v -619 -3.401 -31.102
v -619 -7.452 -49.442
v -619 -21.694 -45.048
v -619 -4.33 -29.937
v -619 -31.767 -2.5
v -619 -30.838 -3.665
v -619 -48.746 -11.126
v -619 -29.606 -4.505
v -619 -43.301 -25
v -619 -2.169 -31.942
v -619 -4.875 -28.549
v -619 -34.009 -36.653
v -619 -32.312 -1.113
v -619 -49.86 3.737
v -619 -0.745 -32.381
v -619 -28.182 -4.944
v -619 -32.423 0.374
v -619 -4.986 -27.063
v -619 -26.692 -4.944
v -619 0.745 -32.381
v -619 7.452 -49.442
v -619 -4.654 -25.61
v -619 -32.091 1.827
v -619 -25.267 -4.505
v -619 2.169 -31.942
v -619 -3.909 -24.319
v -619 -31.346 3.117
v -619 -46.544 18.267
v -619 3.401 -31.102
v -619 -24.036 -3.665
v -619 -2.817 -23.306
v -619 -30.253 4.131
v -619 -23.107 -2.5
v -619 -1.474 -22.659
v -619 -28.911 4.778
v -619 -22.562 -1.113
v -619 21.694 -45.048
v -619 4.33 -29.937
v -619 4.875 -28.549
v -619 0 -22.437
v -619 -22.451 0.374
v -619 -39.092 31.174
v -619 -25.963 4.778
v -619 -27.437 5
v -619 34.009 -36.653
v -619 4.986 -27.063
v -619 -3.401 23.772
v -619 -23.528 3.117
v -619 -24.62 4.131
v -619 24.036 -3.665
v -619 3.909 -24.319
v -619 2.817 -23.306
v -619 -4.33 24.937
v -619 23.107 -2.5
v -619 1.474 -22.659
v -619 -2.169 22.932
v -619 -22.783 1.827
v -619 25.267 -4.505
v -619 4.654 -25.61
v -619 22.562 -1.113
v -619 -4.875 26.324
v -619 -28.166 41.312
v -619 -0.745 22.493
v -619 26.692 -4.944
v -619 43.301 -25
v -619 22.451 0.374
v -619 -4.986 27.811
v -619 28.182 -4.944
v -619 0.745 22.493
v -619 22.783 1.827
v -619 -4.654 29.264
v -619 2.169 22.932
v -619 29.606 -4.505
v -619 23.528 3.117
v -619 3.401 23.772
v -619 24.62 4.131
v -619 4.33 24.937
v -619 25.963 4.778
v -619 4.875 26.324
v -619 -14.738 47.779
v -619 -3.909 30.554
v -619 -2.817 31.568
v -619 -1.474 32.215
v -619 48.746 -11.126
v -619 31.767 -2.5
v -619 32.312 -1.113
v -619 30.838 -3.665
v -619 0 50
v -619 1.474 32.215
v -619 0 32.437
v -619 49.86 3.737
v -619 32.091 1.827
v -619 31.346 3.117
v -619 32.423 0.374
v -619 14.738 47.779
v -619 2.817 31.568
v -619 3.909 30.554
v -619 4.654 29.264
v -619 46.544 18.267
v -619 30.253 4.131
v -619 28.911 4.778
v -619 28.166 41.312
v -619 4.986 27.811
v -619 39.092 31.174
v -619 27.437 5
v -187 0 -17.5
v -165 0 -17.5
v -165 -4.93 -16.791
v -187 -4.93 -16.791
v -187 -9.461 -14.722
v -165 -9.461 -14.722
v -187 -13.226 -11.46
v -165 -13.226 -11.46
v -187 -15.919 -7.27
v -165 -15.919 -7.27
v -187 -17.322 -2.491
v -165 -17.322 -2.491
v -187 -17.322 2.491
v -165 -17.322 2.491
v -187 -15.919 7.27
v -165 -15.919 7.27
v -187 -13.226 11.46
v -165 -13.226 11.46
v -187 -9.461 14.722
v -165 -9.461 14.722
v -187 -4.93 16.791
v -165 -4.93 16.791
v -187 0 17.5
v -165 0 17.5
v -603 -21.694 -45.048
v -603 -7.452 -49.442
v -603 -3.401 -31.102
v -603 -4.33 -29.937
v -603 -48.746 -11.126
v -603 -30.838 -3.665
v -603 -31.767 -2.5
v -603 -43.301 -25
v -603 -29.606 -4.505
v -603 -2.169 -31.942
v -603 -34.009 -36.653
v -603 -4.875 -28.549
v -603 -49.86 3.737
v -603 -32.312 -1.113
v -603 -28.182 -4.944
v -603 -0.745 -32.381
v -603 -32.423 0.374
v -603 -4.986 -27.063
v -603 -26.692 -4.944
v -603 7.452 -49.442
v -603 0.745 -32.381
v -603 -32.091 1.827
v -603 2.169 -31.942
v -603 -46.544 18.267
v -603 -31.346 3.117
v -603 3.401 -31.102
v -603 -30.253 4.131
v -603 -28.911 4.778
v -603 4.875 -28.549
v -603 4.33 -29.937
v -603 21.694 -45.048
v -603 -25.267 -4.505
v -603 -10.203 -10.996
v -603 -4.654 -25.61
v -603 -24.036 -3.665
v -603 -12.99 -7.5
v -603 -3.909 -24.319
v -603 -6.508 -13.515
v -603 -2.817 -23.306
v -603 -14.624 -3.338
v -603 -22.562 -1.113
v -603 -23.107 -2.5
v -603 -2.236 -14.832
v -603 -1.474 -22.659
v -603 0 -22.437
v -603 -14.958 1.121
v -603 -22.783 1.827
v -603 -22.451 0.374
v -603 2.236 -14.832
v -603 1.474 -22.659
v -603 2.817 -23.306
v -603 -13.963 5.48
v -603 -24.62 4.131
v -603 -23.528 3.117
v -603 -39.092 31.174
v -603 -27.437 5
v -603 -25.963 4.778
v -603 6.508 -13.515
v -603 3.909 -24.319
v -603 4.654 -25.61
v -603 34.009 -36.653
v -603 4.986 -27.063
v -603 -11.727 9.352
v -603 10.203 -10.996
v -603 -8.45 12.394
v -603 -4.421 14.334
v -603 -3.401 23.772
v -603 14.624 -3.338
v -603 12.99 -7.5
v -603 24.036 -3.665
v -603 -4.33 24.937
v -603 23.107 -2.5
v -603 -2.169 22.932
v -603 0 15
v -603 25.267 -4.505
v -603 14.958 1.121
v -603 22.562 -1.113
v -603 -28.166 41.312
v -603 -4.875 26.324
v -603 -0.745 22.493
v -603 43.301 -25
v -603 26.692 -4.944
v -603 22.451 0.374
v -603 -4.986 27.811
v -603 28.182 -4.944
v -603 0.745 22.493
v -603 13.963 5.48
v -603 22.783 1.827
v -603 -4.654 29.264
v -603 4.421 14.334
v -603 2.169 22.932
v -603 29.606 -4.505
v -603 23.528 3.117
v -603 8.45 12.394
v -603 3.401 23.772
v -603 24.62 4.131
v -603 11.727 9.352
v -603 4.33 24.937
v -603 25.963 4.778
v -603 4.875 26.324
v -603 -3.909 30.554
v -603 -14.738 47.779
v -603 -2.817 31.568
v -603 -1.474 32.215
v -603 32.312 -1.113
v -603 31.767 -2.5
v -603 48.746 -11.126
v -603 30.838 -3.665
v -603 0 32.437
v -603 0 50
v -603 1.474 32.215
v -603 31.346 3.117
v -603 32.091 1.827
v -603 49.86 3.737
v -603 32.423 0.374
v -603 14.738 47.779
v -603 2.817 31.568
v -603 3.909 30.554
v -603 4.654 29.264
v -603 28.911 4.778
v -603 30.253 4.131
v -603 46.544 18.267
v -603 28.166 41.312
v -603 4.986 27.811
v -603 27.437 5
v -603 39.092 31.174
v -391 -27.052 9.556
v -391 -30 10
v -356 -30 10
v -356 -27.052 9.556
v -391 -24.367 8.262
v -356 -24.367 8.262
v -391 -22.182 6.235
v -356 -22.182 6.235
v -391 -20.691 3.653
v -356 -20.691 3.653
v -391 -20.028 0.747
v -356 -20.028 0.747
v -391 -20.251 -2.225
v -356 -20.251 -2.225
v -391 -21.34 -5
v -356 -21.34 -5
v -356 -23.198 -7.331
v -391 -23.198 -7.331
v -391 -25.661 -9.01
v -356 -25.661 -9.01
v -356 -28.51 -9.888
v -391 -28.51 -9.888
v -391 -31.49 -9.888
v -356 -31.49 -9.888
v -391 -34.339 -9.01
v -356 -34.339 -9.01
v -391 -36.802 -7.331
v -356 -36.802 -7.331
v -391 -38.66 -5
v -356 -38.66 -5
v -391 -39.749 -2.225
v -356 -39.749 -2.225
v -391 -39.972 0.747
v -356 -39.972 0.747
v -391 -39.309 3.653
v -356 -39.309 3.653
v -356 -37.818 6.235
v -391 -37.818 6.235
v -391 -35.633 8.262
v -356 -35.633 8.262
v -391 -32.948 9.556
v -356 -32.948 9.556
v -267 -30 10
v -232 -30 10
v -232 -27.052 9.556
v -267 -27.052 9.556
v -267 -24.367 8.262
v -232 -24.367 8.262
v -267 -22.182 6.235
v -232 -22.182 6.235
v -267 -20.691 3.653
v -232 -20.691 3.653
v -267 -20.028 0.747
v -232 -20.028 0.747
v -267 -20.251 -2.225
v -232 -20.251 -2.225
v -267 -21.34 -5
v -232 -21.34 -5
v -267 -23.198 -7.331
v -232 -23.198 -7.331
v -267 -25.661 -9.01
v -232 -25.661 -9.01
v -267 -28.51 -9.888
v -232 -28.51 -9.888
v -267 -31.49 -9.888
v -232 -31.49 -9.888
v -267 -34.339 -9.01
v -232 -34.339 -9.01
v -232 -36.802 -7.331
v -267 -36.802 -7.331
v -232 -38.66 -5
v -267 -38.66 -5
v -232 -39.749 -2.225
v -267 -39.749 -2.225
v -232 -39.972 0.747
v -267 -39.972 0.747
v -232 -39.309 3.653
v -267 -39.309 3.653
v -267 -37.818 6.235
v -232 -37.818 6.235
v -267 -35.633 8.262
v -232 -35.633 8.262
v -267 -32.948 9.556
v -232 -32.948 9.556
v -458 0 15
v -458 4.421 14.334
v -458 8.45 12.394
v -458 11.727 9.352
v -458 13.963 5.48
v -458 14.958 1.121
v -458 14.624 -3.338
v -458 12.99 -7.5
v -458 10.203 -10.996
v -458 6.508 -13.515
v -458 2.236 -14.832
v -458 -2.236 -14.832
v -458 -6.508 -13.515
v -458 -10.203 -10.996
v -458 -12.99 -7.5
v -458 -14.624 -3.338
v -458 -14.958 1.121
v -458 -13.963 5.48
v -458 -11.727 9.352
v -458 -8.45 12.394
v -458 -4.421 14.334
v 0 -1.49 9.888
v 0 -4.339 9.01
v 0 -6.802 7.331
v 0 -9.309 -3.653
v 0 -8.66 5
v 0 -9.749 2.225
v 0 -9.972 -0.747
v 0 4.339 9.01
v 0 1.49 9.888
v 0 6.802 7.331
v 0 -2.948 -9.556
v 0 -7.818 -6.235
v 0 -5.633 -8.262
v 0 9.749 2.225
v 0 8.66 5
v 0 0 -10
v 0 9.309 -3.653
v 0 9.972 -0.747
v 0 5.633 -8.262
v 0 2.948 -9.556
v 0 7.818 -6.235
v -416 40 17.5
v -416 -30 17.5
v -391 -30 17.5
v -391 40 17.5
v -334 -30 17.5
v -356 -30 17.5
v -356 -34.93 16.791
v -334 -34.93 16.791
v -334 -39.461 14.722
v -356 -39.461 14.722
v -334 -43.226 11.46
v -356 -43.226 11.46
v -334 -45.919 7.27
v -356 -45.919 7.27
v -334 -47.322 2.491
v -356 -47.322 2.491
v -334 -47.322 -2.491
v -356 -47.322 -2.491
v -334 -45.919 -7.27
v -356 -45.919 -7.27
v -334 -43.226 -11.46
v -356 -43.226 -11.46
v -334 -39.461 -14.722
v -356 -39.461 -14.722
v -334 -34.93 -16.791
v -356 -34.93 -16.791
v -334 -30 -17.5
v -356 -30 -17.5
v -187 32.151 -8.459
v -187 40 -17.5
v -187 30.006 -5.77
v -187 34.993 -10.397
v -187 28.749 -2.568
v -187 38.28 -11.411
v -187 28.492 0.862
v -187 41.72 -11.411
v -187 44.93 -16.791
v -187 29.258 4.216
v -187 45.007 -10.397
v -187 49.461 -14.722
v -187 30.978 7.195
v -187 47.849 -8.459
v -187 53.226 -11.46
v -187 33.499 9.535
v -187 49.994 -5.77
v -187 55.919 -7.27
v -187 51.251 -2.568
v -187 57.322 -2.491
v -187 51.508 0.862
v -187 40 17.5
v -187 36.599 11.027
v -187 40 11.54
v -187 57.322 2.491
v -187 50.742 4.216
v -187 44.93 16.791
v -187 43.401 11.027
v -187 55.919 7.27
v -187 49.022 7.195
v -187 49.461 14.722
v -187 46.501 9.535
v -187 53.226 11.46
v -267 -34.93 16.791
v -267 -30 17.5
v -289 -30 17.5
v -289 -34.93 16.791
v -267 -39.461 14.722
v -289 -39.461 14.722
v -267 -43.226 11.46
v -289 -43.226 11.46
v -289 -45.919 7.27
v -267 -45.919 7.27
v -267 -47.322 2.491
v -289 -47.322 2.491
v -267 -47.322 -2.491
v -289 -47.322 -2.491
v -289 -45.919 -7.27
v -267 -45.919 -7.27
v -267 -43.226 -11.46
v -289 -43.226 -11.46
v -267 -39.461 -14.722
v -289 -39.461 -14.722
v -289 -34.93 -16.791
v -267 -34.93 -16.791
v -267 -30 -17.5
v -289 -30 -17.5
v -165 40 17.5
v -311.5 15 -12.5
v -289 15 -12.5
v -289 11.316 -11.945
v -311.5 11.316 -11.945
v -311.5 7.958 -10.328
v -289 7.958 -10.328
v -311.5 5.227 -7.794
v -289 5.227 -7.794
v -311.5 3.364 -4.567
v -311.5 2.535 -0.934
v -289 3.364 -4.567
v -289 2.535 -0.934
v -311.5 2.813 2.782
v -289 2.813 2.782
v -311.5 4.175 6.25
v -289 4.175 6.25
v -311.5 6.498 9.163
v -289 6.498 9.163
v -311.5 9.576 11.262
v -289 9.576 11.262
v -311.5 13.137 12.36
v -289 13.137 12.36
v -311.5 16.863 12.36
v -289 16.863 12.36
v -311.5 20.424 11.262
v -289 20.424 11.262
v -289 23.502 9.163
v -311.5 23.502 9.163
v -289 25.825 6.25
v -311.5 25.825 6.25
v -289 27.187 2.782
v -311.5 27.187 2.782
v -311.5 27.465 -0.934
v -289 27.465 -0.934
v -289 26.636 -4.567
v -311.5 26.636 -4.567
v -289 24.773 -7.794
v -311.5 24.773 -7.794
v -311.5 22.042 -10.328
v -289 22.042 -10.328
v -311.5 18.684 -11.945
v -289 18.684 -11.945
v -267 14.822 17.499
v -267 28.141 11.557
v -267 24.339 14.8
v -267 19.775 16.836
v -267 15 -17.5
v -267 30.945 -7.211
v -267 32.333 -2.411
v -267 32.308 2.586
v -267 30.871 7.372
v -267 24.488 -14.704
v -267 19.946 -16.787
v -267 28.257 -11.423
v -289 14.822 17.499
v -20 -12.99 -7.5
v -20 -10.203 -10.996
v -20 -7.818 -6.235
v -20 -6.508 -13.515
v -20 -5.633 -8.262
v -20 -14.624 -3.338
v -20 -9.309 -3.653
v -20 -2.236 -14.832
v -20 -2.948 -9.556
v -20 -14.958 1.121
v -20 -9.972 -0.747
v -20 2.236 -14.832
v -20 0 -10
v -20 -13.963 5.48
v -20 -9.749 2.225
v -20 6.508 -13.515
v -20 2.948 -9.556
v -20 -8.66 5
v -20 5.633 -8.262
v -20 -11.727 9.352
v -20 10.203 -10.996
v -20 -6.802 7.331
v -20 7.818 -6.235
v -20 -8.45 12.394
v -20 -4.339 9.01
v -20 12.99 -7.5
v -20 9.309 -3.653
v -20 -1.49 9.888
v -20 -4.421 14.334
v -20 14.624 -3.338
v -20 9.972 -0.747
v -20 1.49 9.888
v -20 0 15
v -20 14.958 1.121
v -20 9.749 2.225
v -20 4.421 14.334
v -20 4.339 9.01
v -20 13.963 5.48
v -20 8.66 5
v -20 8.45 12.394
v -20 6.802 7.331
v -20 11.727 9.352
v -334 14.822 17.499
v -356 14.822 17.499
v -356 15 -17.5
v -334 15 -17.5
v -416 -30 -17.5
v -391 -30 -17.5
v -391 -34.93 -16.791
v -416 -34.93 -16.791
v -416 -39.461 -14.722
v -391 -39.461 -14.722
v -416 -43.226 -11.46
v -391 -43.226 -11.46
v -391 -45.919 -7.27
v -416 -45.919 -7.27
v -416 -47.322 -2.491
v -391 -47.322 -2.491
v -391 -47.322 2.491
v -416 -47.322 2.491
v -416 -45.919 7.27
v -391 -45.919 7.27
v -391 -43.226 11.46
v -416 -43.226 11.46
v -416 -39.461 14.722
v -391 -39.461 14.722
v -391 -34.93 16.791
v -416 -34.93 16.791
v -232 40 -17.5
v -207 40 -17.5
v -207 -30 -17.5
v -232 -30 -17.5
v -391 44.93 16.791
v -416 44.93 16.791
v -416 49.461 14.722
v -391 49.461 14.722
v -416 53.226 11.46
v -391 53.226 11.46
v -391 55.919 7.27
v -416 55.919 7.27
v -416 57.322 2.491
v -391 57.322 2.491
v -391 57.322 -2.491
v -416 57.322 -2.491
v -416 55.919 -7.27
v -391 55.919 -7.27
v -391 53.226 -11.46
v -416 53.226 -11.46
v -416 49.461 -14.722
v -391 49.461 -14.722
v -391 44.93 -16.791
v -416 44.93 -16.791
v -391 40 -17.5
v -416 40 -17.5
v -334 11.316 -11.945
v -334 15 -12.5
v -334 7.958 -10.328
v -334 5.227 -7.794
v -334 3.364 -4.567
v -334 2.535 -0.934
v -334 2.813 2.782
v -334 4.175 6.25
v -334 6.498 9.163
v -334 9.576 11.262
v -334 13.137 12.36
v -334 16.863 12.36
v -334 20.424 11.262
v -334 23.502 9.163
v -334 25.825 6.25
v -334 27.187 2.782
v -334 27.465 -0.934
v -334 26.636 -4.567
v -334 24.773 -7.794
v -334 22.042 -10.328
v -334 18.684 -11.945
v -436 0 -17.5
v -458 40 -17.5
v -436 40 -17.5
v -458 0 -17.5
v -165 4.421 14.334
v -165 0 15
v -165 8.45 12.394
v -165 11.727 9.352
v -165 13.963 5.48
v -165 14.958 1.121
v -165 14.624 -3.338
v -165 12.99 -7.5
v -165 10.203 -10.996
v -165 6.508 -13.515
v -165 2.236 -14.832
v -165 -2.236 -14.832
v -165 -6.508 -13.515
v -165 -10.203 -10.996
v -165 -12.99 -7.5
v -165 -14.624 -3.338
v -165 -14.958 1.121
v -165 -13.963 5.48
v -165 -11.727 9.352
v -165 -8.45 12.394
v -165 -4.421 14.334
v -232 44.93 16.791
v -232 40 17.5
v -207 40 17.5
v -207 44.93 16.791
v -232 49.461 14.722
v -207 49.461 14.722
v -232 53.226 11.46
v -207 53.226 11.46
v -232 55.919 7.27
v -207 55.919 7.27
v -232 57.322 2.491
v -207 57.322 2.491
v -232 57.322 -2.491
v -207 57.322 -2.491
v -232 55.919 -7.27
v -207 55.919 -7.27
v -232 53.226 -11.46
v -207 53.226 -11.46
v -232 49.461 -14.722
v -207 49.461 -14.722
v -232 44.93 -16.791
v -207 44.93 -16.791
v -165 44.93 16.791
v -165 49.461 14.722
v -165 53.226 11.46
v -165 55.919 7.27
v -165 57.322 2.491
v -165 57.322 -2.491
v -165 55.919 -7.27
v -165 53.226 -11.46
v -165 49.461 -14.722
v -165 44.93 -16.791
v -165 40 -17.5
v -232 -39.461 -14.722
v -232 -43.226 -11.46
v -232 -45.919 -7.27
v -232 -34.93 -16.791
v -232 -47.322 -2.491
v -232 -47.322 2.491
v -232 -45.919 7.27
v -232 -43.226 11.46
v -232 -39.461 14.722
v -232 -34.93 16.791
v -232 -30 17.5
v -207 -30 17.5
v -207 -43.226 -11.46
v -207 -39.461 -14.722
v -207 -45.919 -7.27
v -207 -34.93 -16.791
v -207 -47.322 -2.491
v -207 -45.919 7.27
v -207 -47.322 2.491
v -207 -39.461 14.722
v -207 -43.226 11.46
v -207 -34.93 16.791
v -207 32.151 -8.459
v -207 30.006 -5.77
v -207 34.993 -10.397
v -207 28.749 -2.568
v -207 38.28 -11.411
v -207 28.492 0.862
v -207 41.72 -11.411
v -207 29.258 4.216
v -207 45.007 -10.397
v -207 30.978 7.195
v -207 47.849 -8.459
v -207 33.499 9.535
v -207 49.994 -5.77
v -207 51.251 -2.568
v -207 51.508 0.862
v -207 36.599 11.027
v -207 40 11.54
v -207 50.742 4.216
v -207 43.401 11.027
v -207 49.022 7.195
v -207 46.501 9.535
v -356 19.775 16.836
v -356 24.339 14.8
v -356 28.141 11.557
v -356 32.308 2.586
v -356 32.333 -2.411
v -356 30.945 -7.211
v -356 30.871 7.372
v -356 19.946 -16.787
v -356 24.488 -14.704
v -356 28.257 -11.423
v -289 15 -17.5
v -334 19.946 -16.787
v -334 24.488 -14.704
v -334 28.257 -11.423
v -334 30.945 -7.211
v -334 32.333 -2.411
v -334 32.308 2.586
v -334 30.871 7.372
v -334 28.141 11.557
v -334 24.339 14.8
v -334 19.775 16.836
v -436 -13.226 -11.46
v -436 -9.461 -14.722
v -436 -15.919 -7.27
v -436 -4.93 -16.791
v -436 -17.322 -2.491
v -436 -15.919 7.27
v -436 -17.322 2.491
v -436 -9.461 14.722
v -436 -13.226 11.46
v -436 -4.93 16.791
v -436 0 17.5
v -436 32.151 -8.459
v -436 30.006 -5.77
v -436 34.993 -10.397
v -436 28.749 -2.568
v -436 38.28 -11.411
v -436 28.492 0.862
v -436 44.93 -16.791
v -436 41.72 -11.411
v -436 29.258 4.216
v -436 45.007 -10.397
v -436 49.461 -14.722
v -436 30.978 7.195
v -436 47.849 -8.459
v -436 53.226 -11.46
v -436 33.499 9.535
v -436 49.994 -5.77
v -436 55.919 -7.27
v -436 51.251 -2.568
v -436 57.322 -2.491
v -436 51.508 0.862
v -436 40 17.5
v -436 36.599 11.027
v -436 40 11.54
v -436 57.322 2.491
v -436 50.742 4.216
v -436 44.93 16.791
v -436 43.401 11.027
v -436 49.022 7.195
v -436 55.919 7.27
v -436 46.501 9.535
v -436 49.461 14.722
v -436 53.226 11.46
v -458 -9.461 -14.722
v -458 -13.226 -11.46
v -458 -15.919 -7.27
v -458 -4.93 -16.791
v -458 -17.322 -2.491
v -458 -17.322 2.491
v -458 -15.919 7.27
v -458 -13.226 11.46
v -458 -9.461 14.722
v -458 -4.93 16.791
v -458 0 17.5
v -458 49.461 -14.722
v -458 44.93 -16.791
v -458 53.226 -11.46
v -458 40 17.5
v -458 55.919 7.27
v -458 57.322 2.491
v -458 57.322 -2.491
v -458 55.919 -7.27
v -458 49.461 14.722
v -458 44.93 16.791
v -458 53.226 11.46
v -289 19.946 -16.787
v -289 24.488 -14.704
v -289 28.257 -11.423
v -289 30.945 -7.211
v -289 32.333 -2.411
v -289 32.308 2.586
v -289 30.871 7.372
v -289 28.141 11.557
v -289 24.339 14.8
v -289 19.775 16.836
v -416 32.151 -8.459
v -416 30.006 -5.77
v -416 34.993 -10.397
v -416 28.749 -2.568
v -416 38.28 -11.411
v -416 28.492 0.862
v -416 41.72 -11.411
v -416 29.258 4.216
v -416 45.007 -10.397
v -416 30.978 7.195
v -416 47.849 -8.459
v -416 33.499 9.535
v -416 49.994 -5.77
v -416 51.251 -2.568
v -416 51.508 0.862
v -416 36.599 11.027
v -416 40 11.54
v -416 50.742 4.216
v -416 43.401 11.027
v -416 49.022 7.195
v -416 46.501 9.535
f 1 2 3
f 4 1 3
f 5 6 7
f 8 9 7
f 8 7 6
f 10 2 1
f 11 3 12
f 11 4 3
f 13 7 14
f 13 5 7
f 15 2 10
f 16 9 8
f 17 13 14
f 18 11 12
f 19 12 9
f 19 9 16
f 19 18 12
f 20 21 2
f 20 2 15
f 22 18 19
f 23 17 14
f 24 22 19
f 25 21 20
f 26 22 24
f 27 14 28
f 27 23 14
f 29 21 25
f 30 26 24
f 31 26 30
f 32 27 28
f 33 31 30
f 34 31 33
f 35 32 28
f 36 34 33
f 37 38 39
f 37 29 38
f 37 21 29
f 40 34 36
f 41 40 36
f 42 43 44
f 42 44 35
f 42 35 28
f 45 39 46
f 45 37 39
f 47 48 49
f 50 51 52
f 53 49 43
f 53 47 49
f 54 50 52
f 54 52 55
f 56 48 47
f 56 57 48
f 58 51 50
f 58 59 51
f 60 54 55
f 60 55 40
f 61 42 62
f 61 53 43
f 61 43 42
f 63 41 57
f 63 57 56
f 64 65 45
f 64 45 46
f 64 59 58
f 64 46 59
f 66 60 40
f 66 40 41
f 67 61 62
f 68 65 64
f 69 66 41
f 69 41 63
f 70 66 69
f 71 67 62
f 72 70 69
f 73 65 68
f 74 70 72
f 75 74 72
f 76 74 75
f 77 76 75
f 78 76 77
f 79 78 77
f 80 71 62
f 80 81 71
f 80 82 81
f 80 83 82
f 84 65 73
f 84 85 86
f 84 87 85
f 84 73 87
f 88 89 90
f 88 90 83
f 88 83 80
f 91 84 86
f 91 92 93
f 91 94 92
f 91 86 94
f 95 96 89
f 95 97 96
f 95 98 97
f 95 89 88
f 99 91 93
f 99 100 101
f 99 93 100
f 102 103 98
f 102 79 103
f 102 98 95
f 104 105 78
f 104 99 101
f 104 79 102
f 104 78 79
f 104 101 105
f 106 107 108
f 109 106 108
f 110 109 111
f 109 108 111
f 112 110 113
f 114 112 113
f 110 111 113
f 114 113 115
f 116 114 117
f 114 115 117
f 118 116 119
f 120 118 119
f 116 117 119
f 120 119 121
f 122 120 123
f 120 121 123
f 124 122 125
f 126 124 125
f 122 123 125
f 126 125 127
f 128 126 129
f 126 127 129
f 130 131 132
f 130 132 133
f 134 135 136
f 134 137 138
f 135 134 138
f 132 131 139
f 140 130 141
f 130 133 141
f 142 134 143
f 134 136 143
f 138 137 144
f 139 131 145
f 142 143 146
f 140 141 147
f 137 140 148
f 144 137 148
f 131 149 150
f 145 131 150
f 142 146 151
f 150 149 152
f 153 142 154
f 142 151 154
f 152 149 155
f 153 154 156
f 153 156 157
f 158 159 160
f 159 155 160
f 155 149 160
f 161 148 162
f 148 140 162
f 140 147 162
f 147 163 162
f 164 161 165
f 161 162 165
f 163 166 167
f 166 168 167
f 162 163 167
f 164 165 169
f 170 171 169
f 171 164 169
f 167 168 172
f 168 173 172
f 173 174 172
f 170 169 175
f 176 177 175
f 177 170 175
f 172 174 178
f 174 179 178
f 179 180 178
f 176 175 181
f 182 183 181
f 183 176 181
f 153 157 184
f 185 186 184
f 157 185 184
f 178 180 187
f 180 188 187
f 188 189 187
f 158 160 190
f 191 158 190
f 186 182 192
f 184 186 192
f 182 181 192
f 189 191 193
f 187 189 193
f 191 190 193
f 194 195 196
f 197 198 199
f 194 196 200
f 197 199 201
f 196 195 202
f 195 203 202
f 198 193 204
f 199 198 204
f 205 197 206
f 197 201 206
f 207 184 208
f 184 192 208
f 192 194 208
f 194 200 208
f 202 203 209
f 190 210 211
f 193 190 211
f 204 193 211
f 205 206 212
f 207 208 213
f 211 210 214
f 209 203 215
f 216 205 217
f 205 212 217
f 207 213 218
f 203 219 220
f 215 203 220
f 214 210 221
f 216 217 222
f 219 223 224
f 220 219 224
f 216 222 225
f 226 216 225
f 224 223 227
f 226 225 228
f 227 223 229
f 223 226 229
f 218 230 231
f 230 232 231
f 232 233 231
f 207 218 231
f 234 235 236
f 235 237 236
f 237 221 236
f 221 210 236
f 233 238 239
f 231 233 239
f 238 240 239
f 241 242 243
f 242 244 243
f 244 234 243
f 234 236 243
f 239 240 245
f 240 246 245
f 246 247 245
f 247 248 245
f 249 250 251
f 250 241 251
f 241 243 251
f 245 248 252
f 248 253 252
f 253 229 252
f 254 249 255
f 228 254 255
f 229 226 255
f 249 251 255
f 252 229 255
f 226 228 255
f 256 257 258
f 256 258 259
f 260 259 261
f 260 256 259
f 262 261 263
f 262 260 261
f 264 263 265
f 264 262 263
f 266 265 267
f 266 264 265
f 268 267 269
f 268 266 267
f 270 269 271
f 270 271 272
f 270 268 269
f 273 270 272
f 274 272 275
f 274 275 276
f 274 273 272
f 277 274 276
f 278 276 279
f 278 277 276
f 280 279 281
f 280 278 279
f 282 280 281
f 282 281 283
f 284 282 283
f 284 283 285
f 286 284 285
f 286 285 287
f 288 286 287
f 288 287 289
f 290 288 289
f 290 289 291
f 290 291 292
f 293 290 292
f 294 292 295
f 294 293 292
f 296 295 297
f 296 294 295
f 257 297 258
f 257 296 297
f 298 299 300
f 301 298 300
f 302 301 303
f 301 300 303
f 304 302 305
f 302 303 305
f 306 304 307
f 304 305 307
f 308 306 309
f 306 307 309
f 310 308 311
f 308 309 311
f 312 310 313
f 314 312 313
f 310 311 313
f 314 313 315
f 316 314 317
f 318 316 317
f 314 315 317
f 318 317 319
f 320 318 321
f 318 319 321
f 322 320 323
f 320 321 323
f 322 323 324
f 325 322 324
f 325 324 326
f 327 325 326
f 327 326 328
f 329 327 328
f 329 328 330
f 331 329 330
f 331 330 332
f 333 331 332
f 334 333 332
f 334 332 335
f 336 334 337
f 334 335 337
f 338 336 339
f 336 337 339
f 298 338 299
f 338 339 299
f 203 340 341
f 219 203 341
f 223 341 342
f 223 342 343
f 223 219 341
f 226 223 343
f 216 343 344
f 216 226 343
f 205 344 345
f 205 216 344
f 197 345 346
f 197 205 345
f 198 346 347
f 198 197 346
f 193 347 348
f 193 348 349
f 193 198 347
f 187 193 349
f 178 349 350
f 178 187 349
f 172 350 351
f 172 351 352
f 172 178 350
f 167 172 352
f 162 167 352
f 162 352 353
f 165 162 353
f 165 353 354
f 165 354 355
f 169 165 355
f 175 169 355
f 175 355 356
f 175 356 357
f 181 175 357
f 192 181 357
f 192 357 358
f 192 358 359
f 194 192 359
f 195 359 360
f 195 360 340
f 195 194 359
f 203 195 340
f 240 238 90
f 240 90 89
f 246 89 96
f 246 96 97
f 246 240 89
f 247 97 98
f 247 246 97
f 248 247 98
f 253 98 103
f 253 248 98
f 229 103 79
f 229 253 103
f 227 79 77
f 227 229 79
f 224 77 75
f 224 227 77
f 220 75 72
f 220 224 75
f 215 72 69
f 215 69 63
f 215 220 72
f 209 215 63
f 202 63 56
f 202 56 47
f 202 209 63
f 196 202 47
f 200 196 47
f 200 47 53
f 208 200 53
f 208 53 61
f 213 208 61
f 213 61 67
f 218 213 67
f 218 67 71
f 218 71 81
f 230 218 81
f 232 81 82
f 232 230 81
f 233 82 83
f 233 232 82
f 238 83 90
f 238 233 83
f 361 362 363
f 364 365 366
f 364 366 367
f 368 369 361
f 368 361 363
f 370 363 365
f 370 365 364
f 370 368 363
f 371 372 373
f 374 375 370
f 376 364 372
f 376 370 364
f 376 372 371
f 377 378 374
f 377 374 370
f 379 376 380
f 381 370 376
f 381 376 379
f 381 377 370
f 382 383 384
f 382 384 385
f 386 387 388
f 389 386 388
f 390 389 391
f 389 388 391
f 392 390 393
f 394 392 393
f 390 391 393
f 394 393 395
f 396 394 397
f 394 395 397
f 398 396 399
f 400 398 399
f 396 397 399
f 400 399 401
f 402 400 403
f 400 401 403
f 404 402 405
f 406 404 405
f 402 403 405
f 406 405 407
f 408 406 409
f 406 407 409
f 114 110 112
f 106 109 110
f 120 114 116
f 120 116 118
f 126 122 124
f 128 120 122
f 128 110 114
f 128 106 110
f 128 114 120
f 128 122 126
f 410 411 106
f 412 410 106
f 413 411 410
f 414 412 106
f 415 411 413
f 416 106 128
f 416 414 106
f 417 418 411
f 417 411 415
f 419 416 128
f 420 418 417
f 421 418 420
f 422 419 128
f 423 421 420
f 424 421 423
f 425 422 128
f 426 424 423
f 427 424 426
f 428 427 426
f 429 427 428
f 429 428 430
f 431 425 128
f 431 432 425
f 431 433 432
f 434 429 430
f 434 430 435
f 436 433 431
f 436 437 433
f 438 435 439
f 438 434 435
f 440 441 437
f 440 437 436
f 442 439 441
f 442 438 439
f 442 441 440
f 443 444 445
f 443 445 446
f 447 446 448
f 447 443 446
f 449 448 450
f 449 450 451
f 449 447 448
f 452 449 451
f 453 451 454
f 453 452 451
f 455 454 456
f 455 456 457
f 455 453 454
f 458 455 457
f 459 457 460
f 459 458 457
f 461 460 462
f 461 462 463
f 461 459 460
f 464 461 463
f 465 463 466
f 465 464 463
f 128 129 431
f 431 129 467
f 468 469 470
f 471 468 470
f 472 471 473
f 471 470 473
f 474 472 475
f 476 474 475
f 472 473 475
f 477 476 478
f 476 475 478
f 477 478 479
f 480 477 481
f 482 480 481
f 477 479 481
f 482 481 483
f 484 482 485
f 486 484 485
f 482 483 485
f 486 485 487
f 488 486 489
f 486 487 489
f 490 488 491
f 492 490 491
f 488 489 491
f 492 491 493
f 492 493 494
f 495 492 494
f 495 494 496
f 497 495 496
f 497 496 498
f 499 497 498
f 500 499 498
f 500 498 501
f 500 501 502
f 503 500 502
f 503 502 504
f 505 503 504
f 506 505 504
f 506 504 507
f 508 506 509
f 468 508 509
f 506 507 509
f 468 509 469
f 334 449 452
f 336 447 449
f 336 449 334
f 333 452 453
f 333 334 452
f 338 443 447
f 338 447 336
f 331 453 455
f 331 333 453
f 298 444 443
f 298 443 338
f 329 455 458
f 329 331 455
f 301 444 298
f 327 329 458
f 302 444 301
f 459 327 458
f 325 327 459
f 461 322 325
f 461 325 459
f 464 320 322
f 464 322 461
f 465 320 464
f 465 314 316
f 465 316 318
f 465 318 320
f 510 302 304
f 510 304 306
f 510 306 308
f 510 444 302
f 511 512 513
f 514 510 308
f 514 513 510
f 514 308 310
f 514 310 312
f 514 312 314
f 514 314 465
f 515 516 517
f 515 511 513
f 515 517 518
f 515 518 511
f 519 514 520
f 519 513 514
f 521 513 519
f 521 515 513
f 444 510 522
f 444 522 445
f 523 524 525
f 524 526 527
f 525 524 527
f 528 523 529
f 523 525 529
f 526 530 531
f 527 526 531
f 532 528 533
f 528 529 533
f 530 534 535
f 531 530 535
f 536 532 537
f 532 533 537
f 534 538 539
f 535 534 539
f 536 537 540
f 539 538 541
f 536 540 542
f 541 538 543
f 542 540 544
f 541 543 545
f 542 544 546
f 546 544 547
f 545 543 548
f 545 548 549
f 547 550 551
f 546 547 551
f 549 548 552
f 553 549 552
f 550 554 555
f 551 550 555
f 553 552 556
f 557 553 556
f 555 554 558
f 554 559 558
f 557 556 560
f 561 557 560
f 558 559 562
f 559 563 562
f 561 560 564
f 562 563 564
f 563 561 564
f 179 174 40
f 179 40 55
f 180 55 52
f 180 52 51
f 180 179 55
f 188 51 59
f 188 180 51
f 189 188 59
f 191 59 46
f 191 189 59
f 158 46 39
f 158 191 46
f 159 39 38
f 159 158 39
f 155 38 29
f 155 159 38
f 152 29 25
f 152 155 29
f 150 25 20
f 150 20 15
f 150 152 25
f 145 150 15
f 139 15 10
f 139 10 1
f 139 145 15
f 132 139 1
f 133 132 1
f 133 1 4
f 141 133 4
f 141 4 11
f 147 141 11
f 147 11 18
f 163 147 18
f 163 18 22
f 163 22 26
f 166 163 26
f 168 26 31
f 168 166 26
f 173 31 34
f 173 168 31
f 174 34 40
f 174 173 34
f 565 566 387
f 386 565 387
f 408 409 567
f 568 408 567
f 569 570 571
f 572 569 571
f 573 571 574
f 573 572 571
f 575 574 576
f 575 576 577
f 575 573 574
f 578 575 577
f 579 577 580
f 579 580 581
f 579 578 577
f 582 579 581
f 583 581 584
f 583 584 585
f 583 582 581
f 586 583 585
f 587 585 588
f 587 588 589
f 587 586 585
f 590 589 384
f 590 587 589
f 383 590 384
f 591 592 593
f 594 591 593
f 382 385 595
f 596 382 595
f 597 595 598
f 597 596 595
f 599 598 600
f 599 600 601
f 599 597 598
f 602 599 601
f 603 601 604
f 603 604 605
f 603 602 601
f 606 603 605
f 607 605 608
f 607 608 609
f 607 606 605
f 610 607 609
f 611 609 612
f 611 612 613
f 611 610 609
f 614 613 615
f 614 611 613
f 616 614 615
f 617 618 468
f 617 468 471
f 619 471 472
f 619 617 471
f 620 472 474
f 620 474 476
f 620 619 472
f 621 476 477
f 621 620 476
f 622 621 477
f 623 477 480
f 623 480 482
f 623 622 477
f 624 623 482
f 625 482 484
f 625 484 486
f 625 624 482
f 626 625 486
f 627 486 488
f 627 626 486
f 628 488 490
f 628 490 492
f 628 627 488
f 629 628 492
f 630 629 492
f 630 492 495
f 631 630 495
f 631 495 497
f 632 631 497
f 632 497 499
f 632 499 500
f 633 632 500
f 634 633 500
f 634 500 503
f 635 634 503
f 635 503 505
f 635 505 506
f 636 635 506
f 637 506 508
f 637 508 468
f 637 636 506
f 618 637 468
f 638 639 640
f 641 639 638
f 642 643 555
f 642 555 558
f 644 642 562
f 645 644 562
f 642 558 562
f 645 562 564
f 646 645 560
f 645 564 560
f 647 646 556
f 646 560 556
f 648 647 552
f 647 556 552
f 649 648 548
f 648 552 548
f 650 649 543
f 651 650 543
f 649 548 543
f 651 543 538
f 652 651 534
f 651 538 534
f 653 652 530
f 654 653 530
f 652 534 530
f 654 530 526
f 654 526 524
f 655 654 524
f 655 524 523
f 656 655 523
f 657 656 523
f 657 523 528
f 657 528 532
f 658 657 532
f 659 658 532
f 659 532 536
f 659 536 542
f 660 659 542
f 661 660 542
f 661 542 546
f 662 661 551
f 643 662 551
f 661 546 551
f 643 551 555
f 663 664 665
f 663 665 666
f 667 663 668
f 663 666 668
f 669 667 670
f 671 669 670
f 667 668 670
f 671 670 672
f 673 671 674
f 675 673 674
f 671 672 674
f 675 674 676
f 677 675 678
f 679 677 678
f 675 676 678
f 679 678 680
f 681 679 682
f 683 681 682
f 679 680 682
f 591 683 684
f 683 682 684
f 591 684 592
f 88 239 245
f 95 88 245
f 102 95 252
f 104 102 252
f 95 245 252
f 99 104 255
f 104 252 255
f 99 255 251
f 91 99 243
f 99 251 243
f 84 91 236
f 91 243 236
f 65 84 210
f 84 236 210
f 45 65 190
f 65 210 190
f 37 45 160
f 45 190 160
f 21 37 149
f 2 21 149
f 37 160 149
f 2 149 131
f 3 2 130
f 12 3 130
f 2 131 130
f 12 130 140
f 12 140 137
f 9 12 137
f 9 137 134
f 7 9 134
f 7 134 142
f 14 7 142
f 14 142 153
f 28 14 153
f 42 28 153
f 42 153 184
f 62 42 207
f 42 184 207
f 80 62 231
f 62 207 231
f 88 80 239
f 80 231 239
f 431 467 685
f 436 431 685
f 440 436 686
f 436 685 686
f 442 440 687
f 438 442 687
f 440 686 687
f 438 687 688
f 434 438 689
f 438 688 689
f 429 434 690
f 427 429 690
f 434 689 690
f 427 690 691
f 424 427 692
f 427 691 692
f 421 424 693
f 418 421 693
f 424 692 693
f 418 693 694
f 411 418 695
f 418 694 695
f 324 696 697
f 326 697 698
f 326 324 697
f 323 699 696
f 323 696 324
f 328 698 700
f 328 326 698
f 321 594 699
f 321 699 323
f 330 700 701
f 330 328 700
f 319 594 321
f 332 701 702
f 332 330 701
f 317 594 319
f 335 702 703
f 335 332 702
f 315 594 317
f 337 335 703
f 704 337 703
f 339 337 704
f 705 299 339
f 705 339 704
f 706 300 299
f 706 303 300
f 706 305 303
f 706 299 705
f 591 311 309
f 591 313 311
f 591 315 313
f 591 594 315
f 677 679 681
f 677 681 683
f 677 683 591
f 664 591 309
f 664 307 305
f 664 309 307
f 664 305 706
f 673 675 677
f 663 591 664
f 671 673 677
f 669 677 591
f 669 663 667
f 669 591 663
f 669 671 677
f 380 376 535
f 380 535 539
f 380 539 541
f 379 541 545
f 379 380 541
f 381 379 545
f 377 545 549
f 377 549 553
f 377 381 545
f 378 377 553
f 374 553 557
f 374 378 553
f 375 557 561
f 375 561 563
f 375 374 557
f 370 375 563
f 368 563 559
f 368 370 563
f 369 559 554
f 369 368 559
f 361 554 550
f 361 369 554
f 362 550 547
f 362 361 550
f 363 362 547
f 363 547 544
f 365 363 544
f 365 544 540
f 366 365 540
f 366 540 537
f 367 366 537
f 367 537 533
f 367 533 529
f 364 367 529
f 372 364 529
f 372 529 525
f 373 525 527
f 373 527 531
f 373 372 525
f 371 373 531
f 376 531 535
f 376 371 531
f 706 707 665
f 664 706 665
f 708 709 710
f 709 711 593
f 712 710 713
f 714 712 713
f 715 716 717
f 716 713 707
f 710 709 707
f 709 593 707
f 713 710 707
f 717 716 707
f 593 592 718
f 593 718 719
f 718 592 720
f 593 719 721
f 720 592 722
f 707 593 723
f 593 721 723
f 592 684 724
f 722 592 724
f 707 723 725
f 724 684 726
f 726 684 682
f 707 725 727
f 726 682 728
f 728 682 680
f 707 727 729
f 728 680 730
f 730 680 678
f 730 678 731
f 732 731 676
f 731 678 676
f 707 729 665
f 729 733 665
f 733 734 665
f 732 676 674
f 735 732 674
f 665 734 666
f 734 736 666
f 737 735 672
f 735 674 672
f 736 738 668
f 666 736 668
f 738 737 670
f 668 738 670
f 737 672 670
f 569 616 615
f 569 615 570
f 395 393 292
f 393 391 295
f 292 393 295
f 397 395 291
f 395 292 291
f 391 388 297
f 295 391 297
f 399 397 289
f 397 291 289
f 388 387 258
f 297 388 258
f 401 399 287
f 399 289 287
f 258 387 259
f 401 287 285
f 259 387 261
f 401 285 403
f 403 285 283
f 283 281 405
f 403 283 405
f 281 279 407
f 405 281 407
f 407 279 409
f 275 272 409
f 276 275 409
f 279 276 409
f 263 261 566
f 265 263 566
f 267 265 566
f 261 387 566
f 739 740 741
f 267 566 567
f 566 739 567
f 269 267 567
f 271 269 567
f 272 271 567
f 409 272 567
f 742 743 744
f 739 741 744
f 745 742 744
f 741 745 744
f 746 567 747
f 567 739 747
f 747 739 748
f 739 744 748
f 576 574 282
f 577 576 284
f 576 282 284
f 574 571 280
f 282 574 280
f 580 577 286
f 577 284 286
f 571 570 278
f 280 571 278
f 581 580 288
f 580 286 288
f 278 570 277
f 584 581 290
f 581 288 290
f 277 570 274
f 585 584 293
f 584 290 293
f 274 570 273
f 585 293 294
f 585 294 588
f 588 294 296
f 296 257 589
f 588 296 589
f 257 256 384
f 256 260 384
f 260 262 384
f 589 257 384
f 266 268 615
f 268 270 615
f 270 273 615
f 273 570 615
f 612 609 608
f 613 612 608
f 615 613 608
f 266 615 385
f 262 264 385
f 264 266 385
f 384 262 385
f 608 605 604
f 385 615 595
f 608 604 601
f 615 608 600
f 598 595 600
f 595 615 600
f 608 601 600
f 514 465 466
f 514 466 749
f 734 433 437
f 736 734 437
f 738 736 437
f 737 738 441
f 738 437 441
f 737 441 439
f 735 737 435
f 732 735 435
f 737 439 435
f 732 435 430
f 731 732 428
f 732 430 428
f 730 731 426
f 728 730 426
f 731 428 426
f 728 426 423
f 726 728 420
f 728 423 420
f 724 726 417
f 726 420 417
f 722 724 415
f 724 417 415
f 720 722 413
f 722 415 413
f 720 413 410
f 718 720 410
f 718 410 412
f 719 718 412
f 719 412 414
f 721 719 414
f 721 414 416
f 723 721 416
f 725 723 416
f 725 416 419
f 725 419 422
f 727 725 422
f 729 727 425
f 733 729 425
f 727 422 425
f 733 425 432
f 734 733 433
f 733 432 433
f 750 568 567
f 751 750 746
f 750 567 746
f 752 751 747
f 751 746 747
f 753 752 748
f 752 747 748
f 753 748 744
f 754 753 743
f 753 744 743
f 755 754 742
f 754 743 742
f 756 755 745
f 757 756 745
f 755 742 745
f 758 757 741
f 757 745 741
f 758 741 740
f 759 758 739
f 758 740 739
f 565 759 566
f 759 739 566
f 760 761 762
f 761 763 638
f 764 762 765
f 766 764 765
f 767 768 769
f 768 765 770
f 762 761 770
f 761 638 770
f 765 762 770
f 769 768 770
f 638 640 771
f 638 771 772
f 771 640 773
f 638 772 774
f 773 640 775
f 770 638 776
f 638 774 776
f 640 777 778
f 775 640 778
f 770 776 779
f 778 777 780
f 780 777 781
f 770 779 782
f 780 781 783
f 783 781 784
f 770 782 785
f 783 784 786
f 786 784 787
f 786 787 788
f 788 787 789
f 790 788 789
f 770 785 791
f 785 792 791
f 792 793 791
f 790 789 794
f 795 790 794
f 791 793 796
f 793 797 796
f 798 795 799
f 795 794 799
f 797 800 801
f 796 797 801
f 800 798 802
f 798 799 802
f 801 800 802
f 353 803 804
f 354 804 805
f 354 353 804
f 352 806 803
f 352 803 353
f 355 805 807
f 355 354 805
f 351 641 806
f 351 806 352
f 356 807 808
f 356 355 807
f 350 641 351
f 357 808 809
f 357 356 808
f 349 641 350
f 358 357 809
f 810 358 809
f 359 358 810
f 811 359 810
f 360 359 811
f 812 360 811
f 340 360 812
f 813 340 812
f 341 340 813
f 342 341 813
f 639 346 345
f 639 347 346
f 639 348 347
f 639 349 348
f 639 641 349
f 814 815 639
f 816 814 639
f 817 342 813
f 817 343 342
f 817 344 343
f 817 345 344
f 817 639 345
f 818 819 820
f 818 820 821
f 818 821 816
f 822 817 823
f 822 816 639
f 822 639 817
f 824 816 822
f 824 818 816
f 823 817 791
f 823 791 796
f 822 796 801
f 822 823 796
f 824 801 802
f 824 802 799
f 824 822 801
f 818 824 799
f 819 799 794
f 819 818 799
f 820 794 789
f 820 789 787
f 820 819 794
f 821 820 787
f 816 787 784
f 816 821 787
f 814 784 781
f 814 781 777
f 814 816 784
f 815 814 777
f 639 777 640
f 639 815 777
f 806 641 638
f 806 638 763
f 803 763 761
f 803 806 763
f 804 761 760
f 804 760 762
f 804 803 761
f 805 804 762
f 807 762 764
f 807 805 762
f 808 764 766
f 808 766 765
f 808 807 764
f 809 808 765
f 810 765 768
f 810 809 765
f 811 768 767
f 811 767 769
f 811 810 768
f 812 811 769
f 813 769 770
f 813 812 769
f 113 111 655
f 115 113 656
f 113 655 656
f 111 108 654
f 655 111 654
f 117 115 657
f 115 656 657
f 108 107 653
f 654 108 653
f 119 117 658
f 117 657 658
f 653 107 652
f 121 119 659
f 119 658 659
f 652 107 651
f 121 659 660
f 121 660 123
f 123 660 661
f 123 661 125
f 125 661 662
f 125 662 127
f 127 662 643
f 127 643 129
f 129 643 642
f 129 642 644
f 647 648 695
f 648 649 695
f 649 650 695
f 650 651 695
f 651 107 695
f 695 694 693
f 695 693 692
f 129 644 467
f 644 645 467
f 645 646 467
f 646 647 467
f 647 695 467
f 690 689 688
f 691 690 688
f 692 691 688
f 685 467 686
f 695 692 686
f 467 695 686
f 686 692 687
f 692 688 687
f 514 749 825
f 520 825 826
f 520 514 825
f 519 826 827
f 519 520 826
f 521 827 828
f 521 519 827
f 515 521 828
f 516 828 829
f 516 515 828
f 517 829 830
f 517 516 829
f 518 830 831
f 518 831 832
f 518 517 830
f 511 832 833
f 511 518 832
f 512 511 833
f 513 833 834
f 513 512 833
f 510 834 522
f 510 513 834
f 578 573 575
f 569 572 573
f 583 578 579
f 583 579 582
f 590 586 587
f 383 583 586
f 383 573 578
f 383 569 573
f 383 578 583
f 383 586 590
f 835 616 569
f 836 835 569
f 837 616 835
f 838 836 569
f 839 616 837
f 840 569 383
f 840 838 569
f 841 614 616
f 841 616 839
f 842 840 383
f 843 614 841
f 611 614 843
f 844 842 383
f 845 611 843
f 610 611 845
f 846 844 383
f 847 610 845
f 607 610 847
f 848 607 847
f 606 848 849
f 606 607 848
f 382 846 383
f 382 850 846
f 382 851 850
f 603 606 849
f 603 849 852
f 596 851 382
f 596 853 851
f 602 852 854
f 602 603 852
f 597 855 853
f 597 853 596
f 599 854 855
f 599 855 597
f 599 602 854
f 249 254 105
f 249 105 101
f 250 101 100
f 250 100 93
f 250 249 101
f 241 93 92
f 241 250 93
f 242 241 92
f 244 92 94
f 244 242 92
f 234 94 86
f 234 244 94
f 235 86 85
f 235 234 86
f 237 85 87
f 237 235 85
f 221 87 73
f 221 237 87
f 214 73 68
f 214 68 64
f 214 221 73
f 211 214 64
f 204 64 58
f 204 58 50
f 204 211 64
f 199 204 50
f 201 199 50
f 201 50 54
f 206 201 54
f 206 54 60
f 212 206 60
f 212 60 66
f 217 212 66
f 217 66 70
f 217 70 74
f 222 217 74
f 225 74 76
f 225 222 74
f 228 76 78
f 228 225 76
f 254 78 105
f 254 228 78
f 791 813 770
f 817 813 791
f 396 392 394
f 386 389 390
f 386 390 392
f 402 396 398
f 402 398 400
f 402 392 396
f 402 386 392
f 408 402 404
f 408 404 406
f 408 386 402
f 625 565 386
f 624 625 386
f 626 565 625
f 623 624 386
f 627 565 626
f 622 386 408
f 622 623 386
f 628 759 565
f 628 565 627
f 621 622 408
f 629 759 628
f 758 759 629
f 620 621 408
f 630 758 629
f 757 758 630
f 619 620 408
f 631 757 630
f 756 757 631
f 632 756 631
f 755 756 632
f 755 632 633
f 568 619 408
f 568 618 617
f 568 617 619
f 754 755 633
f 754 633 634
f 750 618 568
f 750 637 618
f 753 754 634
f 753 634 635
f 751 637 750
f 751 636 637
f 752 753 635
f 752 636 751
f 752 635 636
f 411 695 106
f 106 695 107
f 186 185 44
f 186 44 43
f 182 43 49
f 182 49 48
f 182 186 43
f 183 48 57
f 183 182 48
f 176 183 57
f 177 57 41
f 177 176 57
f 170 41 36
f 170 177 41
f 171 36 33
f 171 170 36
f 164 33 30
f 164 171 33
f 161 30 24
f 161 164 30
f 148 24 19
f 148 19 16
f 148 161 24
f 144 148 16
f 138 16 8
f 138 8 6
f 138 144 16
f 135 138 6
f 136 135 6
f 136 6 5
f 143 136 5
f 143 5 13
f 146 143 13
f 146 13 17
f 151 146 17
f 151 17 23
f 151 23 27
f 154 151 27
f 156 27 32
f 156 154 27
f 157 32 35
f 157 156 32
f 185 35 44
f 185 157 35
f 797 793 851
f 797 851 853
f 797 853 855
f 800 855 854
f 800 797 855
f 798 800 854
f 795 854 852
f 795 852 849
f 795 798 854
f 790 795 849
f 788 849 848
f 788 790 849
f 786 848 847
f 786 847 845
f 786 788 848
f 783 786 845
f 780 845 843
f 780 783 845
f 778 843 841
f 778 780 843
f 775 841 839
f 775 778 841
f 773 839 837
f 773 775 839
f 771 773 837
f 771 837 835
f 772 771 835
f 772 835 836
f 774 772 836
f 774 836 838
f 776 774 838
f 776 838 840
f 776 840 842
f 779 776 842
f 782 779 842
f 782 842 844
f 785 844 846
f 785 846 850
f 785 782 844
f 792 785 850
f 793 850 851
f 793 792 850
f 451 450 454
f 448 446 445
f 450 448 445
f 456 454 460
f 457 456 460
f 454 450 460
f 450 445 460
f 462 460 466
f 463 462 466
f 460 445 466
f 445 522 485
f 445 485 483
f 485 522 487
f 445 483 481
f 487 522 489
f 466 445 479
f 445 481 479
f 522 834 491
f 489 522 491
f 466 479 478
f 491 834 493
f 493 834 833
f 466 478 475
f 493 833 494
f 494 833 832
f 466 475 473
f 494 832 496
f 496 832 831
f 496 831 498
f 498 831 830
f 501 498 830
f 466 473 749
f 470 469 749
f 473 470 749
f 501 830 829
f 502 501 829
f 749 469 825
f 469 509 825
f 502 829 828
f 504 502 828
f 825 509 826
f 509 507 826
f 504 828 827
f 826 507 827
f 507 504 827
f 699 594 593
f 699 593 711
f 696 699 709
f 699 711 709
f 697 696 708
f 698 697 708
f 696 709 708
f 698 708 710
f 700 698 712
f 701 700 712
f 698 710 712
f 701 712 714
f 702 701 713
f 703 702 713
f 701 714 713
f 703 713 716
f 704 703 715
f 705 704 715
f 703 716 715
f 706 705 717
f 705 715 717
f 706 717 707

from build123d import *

# Parameters (mm, degrees)
SKETCH1_R            = 10
BOSS_EXTRUDE1_DEPTH  = 20
SKETCH2_R            = 15
BOSS_EXTRUDE2_DEPTH  = 145
BOSS_EXTRUDE3_DEPTH  = 22
SKETCH4_R            = 11.540024106
BOSS_EXTRUDE4_DEPTH  = 20
BOSS_EXTRUDE7_DEPTH  = 25
SKETCH6_R            = 10
BOSS_EXTRUDE8_DEPTH  = 35
BOSS_EXTRUDE11_DEPTH = 22
SKETCH8_R            = 12.5
BOSS_EXTRUDE12_DEPTH = 22.5
SKETCH9_R            = 50
SKETCH9_R_2          = 5
BOSS_EXTRUDE13_DEPTH = 16


with BuildPart() as part:
    # Sketch1 → Boss-Extrude1 (new body)
    with BuildSketch(Plane(origin=(0, 0, 0), x_dir=(0, 0, -1), z_dir=(1, 0, 0))):
        Circle(SKETCH1_R)
    extrude(amount=-BOSS_EXTRUDE1_DEPTH)

    # Sketch2 → Boss-Extrude2 (add)
    with BuildSketch(Plane.ZY.offset(20)):
        Circle(SKETCH2_R)
    boss_extrude2 = extrude(amount=BOSS_EXTRUDE2_DEPTH)

    # Sketch3 → Boss-Extrude3 (add)
    with BuildSketch(Plane.ZY.offset(165)):
        with BuildLine():
            Line((-17.5, 40), (-17.5, 0))
            ThreePointArc((-17.5, 0), (0, -17.5), (17.5, 0))
            Line((17.5, 0), (17.5, 40))
            ThreePointArc((17.5, 40), (0, 57.5), (-17.5, 40))
        make_face()
    boss_extrude3 = extrude(amount=BOSS_EXTRUDE3_DEPTH)

    # Sketch4 → Boss-Extrude4 (add)
    with BuildSketch(Plane.ZY.offset(187)):
        with Locations((0, 40)):
            Circle(SKETCH4_R)
    boss_extrude4 = extrude(amount=BOSS_EXTRUDE4_DEPTH)

    # Sketch5 → Boss-Extrude7 (add)
    with BuildSketch(Plane.ZY.offset(207)):
        with BuildLine():
            Line((-17.5, 40), (-17.5, -30))
            ThreePointArc((-17.5, -30), (0, -47.5), (17.5, -30))
            Line((17.5, -30), (17.5, 40))
            ThreePointArc((17.5, 40), (0, 57.5), (-17.5, 40))
        make_face()
    boss_extrude7 = extrude(amount=BOSS_EXTRUDE7_DEPTH)

    # Sketch6 → Boss-Extrude8 (add)
    with BuildSketch(Plane.ZY.offset(232)):
        with Locations((0, -30)):
            Circle(SKETCH6_R)
    boss_extrude8 = extrude(amount=BOSS_EXTRUDE8_DEPTH)

    # Sketch7 → Boss-Extrude11 (add)
    with BuildSketch(Plane.ZY.offset(267)):
        with BuildLine():
            Line((17.499097446, 14.822268204), (17.5, -30))
            ThreePointArc((17.5, -30), (0, -47.5), (-17.5, -30))
            Line((-17.5, -30), (-17.5, 15))
            ThreePointArc((-17.5, 15), (0.088867044, 32.49977436), (17.499097446, 14.822268204))
        make_face()
    boss_extrude11 = extrude(amount=BOSS_EXTRUDE11_DEPTH)

    # Sketch8 → Boss-Extrude12 (add)
    with BuildSketch(Plane.ZY.offset(289)):
        with Locations(Location((0, 15, 0), (0, 0, 180))):
            Circle(SKETCH8_R)
    boss_extrude12 = extrude(amount=BOSS_EXTRUDE12_DEPTH)

    # Mirror5: Boss-Extrude12 across plane
    add(boss_extrude12.mirror(Plane(origin=(-311.5, 15, 0), x_dir=(0, 0, 1), z_dir=(-1, 0, 0))))

    # Mirror6: Boss-Extrude11 across plane
    add(boss_extrude11.mirror(Plane.ZY.offset(311.5)))

    # Mirror7: Boss-Extrude8 across plane
    add(boss_extrude8.mirror(Plane.ZY.offset(311.5)))

    # Mirror8: Boss-Extrude7 across plane
    add(boss_extrude7.mirror(Plane.ZY.offset(311.5)))

    # Mirror9: Boss-Extrude4 across plane
    add(boss_extrude4.mirror(Plane.ZY.offset(311.5)))

    # Mirror10: Boss-Extrude3 across plane
    add(boss_extrude3.mirror(Plane.ZY.offset(311.5)))

    # Mirror11: Boss-Extrude2 across plane
    add(boss_extrude2.mirror(Plane.ZY.offset(311.5)))

    # Sketch9 → Boss-Extrude13 (add)
    with BuildSketch(Plane.ZY.offset(603)):
        Circle(SKETCH9_R)
        with Locations((0, 27.436873089)):
            Circle(SKETCH9_R_2, mode=Mode.SUBTRACT)
        with Locations((27.436873089, 0)):
            Circle(SKETCH9_R_2, mode=Mode.SUBTRACT)
        with Locations((0, -27.436873089)):
            Circle(SKETCH9_R_2, mode=Mode.SUBTRACT)
        with Locations((-27.436873089, 0)):
            Circle(SKETCH9_R_2, mode=Mode.SUBTRACT)
    extrude(amount=BOSS_EXTRUDE13_DEPTH)


solid = part.part
